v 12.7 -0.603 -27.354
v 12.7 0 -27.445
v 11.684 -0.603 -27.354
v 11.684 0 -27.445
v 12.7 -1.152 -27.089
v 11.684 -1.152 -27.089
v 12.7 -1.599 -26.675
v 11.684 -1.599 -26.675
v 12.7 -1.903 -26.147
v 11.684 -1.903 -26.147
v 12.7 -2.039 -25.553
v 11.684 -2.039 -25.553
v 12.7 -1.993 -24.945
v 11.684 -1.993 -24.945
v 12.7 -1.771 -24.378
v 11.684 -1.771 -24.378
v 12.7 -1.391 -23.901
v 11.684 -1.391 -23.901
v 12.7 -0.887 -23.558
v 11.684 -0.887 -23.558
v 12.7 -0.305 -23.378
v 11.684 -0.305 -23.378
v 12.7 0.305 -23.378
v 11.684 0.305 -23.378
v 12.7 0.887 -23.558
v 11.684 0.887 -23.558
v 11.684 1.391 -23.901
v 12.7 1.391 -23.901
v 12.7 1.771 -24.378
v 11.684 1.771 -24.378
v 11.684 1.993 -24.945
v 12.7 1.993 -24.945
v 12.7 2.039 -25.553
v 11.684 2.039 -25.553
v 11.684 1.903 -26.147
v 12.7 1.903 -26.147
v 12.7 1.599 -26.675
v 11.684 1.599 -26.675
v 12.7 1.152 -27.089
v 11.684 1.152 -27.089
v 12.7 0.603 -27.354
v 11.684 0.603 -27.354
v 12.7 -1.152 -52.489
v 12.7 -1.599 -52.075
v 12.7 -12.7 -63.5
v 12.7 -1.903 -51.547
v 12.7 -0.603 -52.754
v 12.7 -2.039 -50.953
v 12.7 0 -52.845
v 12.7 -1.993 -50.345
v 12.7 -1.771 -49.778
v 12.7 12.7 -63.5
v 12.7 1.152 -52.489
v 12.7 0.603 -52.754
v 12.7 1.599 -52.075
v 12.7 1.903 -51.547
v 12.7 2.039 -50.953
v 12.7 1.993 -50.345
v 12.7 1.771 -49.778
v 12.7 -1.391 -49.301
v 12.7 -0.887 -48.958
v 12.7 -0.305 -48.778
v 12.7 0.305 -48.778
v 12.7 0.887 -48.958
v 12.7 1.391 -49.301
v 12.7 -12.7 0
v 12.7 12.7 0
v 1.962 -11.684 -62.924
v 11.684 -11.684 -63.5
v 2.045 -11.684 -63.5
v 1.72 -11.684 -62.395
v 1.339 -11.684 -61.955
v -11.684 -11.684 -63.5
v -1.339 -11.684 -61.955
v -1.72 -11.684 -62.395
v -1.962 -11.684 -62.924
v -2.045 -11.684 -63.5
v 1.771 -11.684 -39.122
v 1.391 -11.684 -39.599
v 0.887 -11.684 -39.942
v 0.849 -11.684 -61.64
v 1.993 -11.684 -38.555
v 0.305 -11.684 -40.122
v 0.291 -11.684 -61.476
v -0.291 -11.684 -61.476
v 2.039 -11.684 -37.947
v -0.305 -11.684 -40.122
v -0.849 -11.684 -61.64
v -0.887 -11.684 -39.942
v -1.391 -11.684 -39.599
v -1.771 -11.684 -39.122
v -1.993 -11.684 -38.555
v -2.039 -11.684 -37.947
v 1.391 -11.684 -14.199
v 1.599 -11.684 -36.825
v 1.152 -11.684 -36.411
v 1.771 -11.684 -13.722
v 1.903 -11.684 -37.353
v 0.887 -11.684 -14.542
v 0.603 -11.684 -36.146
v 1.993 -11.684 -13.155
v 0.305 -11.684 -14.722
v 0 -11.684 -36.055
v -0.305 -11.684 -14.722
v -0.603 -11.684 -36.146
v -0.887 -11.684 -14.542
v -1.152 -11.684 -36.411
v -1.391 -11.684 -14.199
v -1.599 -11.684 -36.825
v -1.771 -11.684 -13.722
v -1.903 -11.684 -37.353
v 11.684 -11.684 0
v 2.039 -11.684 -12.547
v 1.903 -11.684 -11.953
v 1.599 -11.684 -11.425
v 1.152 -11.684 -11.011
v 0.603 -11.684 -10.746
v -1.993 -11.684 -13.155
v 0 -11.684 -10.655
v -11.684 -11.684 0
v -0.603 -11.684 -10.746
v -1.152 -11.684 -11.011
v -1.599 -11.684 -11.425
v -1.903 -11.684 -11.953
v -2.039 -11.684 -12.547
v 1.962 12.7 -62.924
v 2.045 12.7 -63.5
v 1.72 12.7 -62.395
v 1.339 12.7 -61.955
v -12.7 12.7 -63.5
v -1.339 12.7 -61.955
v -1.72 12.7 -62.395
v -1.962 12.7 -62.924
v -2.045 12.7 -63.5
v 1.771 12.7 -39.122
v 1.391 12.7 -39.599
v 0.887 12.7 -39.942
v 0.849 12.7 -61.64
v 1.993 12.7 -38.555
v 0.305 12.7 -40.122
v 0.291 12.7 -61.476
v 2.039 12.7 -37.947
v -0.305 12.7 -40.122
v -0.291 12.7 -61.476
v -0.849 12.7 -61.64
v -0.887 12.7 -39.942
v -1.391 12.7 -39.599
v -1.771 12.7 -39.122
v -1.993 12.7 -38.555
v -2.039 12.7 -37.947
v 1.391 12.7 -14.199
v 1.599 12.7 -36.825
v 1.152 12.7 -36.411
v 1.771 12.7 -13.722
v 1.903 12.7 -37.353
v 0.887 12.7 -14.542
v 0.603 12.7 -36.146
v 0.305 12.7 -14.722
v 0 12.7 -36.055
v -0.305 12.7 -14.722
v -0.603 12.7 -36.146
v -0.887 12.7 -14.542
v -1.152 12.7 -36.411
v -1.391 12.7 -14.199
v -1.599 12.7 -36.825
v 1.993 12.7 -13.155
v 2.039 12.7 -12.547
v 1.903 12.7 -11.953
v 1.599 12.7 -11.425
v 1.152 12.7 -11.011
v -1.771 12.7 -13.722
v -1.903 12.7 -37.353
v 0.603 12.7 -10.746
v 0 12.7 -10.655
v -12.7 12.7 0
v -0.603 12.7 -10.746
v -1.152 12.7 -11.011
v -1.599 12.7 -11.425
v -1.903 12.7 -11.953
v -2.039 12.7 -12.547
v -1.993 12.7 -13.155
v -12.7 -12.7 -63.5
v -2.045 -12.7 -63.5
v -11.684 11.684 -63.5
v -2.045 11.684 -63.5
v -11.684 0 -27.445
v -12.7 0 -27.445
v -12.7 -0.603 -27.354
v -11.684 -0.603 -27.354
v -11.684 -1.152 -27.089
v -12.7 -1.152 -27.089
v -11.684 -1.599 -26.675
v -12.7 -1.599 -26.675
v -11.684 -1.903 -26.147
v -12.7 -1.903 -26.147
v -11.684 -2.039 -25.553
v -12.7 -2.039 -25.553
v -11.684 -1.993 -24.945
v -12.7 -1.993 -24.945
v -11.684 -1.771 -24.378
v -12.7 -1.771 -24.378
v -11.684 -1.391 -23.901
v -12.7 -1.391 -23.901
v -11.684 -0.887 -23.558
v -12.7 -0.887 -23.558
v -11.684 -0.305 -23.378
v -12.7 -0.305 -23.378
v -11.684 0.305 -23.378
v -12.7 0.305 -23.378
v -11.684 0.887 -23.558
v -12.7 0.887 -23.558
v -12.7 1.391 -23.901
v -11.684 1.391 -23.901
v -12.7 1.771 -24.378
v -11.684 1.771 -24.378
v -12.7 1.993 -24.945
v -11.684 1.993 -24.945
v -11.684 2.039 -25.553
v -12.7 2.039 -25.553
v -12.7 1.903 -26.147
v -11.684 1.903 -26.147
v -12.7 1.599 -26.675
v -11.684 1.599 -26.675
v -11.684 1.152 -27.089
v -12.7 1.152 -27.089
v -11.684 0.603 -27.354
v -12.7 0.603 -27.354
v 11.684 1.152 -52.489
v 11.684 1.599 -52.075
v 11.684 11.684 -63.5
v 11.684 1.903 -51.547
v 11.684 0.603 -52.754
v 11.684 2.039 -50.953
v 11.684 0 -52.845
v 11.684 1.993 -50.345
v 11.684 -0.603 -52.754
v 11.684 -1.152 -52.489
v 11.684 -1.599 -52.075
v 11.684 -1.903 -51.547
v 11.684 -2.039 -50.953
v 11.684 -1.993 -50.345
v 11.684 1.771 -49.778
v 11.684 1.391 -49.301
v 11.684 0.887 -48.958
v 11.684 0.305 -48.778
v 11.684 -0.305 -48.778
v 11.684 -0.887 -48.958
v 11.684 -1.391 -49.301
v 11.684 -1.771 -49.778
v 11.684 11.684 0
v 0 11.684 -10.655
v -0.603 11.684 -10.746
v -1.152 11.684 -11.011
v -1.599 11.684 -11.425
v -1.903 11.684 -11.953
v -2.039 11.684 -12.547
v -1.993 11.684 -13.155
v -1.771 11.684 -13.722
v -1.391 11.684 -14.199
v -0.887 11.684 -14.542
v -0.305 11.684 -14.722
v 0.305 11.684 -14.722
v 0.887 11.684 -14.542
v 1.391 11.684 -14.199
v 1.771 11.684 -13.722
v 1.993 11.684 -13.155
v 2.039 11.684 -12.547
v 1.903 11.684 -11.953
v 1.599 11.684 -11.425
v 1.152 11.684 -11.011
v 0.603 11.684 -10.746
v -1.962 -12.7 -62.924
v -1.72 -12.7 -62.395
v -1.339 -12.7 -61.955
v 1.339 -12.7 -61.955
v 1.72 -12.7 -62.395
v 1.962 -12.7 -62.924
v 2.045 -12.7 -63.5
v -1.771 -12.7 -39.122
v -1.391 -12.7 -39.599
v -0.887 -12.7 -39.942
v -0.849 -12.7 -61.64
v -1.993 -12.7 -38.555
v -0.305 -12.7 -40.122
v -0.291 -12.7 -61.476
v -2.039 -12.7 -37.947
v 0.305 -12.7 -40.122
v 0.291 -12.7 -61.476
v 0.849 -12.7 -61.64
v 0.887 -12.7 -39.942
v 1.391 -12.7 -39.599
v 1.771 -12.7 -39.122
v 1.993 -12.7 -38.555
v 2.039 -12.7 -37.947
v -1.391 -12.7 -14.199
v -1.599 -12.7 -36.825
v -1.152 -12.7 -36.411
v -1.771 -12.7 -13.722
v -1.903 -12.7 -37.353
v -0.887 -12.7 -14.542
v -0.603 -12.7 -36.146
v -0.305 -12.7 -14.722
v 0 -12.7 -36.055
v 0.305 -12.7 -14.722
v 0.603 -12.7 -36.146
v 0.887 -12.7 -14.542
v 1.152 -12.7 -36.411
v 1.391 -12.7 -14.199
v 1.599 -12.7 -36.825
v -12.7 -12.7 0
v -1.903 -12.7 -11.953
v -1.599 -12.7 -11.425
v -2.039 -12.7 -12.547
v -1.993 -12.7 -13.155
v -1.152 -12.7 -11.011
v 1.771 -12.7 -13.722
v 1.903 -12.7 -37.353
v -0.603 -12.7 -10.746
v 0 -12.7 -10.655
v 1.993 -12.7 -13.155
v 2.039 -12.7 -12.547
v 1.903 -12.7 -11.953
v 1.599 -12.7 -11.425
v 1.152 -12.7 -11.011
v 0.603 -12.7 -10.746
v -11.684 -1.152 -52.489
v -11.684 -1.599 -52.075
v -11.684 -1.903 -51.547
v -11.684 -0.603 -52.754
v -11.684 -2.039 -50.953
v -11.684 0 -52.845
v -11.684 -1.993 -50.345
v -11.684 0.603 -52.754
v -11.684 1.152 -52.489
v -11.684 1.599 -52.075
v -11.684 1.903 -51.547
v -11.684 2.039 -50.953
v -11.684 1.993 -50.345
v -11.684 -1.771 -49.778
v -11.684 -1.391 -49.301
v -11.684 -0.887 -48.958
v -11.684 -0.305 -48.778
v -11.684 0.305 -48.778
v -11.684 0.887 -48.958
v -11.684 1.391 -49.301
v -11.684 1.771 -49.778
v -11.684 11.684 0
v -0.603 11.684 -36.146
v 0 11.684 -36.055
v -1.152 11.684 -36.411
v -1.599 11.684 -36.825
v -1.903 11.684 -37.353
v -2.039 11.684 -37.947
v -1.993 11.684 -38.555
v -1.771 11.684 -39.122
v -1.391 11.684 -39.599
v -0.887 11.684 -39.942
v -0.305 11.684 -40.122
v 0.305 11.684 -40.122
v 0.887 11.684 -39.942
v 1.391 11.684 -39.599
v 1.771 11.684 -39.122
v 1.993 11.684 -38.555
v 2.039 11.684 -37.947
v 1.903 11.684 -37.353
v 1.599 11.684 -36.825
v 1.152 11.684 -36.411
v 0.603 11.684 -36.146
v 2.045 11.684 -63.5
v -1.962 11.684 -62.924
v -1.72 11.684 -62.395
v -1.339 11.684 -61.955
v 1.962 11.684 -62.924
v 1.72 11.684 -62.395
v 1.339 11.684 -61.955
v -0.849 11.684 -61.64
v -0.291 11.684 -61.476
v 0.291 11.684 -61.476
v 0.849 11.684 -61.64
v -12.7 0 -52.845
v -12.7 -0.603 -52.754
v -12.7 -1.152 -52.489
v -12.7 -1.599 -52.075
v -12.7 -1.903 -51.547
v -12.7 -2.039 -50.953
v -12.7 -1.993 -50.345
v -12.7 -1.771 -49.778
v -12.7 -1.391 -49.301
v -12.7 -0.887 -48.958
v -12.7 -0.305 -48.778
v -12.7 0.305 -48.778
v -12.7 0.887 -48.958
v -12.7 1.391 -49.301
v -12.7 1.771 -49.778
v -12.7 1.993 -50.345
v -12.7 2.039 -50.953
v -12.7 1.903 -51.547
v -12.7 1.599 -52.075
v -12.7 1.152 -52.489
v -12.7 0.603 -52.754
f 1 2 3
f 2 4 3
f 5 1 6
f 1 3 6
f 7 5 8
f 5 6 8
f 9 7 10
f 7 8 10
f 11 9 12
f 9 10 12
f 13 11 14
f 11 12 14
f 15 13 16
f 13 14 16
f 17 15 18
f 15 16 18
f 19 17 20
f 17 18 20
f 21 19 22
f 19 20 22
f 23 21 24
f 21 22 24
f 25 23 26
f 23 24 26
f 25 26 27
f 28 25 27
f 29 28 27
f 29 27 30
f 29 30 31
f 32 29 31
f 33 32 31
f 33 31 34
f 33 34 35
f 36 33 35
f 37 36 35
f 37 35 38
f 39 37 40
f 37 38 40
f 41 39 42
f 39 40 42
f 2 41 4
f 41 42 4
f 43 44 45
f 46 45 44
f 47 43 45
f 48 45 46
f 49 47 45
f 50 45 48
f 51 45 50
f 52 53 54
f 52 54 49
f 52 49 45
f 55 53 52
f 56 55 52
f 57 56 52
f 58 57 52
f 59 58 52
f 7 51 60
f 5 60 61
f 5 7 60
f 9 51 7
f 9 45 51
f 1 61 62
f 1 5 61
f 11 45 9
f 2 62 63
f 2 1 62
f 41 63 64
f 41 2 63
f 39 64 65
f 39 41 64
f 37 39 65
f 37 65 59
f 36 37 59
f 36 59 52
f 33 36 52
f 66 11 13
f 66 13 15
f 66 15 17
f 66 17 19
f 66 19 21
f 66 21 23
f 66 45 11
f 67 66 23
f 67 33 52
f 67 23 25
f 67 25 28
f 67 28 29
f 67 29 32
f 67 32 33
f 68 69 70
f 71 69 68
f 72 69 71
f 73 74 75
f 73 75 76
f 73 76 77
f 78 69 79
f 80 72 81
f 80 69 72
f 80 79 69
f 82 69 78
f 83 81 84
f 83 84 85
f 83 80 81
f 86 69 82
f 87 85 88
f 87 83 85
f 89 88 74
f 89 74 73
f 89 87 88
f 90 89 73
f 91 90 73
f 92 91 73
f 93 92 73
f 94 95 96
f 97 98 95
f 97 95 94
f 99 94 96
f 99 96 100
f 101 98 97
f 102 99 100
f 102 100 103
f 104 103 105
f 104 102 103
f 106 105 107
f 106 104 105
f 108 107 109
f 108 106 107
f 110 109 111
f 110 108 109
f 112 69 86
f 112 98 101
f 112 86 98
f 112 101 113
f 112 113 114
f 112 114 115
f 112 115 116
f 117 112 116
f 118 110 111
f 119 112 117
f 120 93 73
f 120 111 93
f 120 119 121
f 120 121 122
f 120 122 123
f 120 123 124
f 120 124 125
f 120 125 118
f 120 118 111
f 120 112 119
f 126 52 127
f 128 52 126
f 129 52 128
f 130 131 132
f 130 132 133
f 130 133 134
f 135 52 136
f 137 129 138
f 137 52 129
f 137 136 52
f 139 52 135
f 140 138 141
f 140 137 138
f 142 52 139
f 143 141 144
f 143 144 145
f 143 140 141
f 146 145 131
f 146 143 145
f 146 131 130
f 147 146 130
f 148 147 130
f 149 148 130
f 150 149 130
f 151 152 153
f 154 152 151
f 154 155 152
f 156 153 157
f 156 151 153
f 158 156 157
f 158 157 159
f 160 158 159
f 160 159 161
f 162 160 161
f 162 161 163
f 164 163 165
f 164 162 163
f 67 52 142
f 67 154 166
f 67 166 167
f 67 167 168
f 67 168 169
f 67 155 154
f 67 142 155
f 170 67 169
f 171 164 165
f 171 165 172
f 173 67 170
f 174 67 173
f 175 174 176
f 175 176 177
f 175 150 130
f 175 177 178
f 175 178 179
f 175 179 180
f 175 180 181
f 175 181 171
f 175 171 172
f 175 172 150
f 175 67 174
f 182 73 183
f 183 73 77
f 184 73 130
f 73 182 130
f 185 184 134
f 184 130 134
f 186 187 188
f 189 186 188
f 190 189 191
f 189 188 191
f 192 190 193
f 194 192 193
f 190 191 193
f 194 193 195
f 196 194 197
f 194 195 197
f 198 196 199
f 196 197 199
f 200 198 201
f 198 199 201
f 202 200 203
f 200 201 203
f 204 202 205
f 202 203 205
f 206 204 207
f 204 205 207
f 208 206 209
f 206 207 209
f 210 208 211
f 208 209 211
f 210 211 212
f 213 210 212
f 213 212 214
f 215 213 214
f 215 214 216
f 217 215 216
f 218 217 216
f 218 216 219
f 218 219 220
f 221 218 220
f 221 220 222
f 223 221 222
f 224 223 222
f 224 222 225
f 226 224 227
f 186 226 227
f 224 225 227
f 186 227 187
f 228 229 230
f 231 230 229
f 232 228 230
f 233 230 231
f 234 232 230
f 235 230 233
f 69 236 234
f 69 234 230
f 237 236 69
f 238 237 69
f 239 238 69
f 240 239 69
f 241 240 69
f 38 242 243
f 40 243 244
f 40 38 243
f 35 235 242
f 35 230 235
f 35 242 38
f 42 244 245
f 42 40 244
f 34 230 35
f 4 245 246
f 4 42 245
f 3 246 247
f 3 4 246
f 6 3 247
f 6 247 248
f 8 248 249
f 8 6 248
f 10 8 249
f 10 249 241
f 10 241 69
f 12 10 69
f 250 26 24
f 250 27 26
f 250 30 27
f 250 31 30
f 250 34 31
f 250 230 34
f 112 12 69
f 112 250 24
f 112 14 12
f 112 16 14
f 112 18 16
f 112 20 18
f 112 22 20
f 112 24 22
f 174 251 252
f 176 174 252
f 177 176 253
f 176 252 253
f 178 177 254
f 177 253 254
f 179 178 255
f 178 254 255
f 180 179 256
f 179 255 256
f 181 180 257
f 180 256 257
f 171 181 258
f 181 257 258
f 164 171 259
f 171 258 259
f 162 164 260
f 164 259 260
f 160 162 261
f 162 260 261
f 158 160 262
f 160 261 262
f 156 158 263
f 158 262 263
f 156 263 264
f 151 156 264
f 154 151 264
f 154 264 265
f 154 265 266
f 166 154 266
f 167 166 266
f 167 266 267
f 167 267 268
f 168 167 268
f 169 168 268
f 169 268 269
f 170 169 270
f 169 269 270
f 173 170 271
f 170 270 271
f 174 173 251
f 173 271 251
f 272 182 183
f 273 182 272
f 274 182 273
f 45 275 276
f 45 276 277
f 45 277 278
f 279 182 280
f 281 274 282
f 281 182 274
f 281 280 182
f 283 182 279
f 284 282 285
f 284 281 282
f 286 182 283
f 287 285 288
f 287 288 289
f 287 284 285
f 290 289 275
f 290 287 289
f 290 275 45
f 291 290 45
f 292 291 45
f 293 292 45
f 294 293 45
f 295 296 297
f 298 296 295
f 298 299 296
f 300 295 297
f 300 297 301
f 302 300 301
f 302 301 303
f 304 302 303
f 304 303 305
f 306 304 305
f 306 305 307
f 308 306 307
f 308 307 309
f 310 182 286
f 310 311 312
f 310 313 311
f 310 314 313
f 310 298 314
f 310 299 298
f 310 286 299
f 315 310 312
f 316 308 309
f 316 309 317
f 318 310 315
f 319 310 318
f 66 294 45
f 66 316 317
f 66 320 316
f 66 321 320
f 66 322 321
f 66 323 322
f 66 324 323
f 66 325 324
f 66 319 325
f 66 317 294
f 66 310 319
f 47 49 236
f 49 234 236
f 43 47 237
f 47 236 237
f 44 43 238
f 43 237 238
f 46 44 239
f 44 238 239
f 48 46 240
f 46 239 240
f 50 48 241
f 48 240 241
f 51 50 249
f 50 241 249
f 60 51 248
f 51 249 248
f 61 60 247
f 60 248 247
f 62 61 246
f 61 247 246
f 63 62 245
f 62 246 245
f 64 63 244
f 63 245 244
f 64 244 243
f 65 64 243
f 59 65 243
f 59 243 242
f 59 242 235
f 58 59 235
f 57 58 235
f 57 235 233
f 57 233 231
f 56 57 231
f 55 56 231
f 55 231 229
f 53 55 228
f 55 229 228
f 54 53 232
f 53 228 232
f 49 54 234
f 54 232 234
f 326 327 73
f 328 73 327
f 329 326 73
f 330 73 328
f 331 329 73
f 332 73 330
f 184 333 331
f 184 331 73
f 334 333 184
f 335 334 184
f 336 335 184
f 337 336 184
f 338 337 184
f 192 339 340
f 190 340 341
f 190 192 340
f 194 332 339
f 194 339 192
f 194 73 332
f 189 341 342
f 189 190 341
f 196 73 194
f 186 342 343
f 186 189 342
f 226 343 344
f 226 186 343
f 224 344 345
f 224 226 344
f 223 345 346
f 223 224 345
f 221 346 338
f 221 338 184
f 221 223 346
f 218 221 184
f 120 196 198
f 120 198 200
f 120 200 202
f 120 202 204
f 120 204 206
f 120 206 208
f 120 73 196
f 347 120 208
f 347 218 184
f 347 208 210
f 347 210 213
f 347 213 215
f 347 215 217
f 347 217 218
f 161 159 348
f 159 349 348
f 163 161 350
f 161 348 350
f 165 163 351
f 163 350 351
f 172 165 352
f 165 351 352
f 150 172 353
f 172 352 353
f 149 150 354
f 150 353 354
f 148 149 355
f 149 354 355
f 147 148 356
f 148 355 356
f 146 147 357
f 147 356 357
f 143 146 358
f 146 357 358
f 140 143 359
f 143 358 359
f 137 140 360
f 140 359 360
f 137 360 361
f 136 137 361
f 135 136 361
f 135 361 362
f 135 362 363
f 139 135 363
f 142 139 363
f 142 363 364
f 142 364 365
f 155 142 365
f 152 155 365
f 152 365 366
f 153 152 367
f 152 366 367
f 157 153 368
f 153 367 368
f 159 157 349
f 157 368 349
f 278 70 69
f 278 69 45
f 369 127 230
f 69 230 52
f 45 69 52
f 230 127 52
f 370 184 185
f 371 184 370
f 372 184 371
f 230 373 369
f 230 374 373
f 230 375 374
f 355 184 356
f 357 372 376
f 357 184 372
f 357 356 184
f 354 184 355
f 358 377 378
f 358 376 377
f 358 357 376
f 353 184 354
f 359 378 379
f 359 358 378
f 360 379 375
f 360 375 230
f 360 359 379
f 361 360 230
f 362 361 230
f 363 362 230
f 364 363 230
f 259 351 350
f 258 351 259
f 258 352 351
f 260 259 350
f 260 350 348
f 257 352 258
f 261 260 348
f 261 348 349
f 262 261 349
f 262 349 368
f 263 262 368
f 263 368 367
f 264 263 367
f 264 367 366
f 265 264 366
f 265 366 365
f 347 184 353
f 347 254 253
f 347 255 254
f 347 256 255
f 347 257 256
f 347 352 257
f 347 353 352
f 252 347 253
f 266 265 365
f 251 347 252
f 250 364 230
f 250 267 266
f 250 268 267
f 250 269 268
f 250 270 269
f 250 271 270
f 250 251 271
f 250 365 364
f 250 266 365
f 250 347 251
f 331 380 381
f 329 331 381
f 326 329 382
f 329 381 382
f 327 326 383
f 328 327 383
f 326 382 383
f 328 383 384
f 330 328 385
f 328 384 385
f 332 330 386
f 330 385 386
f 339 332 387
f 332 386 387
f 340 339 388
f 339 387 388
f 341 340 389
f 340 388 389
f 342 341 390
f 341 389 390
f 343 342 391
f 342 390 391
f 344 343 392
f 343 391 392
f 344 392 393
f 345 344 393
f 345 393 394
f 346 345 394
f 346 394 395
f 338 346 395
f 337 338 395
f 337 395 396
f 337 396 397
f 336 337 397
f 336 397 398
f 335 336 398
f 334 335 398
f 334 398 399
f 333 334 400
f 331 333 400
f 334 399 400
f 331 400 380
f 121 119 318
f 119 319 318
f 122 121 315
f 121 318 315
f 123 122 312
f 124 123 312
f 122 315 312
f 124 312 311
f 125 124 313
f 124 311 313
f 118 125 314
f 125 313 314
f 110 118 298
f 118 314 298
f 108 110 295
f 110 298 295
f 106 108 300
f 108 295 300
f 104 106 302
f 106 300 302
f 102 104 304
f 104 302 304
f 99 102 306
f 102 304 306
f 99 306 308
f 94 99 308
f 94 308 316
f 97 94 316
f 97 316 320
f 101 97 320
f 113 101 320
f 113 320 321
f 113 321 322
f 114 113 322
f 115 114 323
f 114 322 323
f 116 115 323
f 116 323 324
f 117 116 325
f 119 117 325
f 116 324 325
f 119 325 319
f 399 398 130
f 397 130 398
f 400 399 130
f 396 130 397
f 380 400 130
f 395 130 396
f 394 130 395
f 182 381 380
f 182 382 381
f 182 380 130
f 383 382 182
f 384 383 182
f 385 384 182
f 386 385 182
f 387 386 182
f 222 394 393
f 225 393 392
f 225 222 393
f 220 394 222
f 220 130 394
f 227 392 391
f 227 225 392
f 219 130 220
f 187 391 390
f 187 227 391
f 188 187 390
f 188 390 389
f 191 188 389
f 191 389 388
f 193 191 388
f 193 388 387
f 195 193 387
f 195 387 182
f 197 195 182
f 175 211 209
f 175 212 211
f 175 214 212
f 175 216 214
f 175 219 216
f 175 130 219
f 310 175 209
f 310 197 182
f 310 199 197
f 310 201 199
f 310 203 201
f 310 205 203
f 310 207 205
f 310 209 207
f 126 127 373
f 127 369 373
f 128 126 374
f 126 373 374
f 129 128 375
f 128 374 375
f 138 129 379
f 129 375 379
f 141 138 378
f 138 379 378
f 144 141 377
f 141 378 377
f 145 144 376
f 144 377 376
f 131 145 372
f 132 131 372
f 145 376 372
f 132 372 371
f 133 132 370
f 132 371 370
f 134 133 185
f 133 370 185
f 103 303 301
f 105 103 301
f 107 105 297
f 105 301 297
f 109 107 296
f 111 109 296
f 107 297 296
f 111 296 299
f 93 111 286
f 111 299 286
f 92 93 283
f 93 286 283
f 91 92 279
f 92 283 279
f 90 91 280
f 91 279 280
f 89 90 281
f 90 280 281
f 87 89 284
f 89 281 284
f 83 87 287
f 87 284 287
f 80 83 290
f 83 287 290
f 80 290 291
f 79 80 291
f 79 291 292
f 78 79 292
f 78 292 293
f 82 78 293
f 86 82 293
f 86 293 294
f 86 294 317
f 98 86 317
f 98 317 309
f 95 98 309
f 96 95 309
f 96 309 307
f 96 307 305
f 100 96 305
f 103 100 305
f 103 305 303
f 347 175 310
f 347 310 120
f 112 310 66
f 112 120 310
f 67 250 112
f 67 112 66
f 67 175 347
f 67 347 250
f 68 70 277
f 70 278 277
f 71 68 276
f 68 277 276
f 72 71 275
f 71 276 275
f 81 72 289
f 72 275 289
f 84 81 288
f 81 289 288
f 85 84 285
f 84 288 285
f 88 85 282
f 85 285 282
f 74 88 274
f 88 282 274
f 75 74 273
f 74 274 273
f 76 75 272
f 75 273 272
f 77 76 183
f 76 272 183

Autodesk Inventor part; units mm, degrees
ref_plane "YZ Plane" through (0, 0, 0) normal (1, 0, 0) x (0, 1, 0)
ref_plane "XZ Plane" through (0, 0, 0) normal (0, 1, 0) x (-1, 0, 0)
ref_plane "XY Plane" through (0, 0, 0) normal (0, 0, 1) x (1, 0, 0)
sketch "Sketch1" plane through (0, 0, 0) normal (0, 0, 1) x (1, 0, 0)
  line L0 (-12.7, -12.7) -> (12.7, -12.7)
  line L1 (12.7, -12.7) -> (12.7, 12.7)
  line L2 (12.7, 12.7) -> (-12.7, 12.7)
  line L3 (-12.7, 12.7) -> (-12.7, -12.7)
  line L4 (-12.7, -12.7) -> (12.7, 12.7) construction
  line L5 (12.7, -12.7) -> (-12.7, 12.7) construction
  line L6 (-11.684, 11.684) -> (11.684, 11.684)
  line L7 (11.684, 11.684) -> (11.684, -11.684)
  line L8 (11.684, -11.684) -> (-11.684, -11.684)
  line L9 (-11.684, -11.684) -> (-11.684, 11.684)
  point P0 (0, 0)
  dimension "l1" = 25.4
  dimension "l2" = 25.4
  dimension "wt" = 1.016
extrude "Extrusion1" add sketch "Sketch1" against normal blind 63.5
sketch "Sketch2" plane through (-12.7, 12.7, 0) normal (0, 1, 0) x (1, 0, 0)
  line L0 (25.4, 0) -> (0, 0) projected
  line L1 (25.4, 0) -> (25.4, 63.5) projected
  line L2 (0, 63.5) -> (25.4, 63.5) projected
  line L3 (0, 0) -> (0, 63.5) projected
  point P0 (12.7, 0)
  point P1 (12.7, 12.7)
  dimension "d5" = 25.4
  dimension "d6" = 12.7
  dimension "d7" = 12.7
hole "Hole3" at (0, 12.7, -12.7) direction (0, -1, 0) diameter 4.0894 end through all
sketch "Sketch3" plane through (12.7, -12.7, 0) normal (1, 0, 0) x (0, 0, -1)
  line L0 (0, 0) -> (0, 25.4) projected
  line L1 (0, 0) -> (63.5, 0) projected
  line L2 (63.5, 25.4) -> (63.5, 0) projected
  line L3 (0, 25.4) -> (63.5, 25.4) projected
  point P0 (0, 12.7)
  point P1 (25.4, 12.7)
  dimension "d22" = 25.4
  dimension "d23" = 12.7
  dimension "d24" = 25.4
hole "Hole4" at (12.7, 0, -25.4) direction (-1, 0, 0) diameter 4.0894 end through all
pattern_linear "Rectangular Pattern1" count 4 spacing 25.4 along (0, 0, -1) of "Hole3"
pattern_linear "Rectangular Pattern2" count 4 spacing 25.4 along (0, 0, -1) of "Hole4"
equation "\"d6\" = 0.5 * d5"
equation "\"d23\" = 0.5 * d22"
properties part number "versatubing_1x1x40" material "Aluminum 6061"
